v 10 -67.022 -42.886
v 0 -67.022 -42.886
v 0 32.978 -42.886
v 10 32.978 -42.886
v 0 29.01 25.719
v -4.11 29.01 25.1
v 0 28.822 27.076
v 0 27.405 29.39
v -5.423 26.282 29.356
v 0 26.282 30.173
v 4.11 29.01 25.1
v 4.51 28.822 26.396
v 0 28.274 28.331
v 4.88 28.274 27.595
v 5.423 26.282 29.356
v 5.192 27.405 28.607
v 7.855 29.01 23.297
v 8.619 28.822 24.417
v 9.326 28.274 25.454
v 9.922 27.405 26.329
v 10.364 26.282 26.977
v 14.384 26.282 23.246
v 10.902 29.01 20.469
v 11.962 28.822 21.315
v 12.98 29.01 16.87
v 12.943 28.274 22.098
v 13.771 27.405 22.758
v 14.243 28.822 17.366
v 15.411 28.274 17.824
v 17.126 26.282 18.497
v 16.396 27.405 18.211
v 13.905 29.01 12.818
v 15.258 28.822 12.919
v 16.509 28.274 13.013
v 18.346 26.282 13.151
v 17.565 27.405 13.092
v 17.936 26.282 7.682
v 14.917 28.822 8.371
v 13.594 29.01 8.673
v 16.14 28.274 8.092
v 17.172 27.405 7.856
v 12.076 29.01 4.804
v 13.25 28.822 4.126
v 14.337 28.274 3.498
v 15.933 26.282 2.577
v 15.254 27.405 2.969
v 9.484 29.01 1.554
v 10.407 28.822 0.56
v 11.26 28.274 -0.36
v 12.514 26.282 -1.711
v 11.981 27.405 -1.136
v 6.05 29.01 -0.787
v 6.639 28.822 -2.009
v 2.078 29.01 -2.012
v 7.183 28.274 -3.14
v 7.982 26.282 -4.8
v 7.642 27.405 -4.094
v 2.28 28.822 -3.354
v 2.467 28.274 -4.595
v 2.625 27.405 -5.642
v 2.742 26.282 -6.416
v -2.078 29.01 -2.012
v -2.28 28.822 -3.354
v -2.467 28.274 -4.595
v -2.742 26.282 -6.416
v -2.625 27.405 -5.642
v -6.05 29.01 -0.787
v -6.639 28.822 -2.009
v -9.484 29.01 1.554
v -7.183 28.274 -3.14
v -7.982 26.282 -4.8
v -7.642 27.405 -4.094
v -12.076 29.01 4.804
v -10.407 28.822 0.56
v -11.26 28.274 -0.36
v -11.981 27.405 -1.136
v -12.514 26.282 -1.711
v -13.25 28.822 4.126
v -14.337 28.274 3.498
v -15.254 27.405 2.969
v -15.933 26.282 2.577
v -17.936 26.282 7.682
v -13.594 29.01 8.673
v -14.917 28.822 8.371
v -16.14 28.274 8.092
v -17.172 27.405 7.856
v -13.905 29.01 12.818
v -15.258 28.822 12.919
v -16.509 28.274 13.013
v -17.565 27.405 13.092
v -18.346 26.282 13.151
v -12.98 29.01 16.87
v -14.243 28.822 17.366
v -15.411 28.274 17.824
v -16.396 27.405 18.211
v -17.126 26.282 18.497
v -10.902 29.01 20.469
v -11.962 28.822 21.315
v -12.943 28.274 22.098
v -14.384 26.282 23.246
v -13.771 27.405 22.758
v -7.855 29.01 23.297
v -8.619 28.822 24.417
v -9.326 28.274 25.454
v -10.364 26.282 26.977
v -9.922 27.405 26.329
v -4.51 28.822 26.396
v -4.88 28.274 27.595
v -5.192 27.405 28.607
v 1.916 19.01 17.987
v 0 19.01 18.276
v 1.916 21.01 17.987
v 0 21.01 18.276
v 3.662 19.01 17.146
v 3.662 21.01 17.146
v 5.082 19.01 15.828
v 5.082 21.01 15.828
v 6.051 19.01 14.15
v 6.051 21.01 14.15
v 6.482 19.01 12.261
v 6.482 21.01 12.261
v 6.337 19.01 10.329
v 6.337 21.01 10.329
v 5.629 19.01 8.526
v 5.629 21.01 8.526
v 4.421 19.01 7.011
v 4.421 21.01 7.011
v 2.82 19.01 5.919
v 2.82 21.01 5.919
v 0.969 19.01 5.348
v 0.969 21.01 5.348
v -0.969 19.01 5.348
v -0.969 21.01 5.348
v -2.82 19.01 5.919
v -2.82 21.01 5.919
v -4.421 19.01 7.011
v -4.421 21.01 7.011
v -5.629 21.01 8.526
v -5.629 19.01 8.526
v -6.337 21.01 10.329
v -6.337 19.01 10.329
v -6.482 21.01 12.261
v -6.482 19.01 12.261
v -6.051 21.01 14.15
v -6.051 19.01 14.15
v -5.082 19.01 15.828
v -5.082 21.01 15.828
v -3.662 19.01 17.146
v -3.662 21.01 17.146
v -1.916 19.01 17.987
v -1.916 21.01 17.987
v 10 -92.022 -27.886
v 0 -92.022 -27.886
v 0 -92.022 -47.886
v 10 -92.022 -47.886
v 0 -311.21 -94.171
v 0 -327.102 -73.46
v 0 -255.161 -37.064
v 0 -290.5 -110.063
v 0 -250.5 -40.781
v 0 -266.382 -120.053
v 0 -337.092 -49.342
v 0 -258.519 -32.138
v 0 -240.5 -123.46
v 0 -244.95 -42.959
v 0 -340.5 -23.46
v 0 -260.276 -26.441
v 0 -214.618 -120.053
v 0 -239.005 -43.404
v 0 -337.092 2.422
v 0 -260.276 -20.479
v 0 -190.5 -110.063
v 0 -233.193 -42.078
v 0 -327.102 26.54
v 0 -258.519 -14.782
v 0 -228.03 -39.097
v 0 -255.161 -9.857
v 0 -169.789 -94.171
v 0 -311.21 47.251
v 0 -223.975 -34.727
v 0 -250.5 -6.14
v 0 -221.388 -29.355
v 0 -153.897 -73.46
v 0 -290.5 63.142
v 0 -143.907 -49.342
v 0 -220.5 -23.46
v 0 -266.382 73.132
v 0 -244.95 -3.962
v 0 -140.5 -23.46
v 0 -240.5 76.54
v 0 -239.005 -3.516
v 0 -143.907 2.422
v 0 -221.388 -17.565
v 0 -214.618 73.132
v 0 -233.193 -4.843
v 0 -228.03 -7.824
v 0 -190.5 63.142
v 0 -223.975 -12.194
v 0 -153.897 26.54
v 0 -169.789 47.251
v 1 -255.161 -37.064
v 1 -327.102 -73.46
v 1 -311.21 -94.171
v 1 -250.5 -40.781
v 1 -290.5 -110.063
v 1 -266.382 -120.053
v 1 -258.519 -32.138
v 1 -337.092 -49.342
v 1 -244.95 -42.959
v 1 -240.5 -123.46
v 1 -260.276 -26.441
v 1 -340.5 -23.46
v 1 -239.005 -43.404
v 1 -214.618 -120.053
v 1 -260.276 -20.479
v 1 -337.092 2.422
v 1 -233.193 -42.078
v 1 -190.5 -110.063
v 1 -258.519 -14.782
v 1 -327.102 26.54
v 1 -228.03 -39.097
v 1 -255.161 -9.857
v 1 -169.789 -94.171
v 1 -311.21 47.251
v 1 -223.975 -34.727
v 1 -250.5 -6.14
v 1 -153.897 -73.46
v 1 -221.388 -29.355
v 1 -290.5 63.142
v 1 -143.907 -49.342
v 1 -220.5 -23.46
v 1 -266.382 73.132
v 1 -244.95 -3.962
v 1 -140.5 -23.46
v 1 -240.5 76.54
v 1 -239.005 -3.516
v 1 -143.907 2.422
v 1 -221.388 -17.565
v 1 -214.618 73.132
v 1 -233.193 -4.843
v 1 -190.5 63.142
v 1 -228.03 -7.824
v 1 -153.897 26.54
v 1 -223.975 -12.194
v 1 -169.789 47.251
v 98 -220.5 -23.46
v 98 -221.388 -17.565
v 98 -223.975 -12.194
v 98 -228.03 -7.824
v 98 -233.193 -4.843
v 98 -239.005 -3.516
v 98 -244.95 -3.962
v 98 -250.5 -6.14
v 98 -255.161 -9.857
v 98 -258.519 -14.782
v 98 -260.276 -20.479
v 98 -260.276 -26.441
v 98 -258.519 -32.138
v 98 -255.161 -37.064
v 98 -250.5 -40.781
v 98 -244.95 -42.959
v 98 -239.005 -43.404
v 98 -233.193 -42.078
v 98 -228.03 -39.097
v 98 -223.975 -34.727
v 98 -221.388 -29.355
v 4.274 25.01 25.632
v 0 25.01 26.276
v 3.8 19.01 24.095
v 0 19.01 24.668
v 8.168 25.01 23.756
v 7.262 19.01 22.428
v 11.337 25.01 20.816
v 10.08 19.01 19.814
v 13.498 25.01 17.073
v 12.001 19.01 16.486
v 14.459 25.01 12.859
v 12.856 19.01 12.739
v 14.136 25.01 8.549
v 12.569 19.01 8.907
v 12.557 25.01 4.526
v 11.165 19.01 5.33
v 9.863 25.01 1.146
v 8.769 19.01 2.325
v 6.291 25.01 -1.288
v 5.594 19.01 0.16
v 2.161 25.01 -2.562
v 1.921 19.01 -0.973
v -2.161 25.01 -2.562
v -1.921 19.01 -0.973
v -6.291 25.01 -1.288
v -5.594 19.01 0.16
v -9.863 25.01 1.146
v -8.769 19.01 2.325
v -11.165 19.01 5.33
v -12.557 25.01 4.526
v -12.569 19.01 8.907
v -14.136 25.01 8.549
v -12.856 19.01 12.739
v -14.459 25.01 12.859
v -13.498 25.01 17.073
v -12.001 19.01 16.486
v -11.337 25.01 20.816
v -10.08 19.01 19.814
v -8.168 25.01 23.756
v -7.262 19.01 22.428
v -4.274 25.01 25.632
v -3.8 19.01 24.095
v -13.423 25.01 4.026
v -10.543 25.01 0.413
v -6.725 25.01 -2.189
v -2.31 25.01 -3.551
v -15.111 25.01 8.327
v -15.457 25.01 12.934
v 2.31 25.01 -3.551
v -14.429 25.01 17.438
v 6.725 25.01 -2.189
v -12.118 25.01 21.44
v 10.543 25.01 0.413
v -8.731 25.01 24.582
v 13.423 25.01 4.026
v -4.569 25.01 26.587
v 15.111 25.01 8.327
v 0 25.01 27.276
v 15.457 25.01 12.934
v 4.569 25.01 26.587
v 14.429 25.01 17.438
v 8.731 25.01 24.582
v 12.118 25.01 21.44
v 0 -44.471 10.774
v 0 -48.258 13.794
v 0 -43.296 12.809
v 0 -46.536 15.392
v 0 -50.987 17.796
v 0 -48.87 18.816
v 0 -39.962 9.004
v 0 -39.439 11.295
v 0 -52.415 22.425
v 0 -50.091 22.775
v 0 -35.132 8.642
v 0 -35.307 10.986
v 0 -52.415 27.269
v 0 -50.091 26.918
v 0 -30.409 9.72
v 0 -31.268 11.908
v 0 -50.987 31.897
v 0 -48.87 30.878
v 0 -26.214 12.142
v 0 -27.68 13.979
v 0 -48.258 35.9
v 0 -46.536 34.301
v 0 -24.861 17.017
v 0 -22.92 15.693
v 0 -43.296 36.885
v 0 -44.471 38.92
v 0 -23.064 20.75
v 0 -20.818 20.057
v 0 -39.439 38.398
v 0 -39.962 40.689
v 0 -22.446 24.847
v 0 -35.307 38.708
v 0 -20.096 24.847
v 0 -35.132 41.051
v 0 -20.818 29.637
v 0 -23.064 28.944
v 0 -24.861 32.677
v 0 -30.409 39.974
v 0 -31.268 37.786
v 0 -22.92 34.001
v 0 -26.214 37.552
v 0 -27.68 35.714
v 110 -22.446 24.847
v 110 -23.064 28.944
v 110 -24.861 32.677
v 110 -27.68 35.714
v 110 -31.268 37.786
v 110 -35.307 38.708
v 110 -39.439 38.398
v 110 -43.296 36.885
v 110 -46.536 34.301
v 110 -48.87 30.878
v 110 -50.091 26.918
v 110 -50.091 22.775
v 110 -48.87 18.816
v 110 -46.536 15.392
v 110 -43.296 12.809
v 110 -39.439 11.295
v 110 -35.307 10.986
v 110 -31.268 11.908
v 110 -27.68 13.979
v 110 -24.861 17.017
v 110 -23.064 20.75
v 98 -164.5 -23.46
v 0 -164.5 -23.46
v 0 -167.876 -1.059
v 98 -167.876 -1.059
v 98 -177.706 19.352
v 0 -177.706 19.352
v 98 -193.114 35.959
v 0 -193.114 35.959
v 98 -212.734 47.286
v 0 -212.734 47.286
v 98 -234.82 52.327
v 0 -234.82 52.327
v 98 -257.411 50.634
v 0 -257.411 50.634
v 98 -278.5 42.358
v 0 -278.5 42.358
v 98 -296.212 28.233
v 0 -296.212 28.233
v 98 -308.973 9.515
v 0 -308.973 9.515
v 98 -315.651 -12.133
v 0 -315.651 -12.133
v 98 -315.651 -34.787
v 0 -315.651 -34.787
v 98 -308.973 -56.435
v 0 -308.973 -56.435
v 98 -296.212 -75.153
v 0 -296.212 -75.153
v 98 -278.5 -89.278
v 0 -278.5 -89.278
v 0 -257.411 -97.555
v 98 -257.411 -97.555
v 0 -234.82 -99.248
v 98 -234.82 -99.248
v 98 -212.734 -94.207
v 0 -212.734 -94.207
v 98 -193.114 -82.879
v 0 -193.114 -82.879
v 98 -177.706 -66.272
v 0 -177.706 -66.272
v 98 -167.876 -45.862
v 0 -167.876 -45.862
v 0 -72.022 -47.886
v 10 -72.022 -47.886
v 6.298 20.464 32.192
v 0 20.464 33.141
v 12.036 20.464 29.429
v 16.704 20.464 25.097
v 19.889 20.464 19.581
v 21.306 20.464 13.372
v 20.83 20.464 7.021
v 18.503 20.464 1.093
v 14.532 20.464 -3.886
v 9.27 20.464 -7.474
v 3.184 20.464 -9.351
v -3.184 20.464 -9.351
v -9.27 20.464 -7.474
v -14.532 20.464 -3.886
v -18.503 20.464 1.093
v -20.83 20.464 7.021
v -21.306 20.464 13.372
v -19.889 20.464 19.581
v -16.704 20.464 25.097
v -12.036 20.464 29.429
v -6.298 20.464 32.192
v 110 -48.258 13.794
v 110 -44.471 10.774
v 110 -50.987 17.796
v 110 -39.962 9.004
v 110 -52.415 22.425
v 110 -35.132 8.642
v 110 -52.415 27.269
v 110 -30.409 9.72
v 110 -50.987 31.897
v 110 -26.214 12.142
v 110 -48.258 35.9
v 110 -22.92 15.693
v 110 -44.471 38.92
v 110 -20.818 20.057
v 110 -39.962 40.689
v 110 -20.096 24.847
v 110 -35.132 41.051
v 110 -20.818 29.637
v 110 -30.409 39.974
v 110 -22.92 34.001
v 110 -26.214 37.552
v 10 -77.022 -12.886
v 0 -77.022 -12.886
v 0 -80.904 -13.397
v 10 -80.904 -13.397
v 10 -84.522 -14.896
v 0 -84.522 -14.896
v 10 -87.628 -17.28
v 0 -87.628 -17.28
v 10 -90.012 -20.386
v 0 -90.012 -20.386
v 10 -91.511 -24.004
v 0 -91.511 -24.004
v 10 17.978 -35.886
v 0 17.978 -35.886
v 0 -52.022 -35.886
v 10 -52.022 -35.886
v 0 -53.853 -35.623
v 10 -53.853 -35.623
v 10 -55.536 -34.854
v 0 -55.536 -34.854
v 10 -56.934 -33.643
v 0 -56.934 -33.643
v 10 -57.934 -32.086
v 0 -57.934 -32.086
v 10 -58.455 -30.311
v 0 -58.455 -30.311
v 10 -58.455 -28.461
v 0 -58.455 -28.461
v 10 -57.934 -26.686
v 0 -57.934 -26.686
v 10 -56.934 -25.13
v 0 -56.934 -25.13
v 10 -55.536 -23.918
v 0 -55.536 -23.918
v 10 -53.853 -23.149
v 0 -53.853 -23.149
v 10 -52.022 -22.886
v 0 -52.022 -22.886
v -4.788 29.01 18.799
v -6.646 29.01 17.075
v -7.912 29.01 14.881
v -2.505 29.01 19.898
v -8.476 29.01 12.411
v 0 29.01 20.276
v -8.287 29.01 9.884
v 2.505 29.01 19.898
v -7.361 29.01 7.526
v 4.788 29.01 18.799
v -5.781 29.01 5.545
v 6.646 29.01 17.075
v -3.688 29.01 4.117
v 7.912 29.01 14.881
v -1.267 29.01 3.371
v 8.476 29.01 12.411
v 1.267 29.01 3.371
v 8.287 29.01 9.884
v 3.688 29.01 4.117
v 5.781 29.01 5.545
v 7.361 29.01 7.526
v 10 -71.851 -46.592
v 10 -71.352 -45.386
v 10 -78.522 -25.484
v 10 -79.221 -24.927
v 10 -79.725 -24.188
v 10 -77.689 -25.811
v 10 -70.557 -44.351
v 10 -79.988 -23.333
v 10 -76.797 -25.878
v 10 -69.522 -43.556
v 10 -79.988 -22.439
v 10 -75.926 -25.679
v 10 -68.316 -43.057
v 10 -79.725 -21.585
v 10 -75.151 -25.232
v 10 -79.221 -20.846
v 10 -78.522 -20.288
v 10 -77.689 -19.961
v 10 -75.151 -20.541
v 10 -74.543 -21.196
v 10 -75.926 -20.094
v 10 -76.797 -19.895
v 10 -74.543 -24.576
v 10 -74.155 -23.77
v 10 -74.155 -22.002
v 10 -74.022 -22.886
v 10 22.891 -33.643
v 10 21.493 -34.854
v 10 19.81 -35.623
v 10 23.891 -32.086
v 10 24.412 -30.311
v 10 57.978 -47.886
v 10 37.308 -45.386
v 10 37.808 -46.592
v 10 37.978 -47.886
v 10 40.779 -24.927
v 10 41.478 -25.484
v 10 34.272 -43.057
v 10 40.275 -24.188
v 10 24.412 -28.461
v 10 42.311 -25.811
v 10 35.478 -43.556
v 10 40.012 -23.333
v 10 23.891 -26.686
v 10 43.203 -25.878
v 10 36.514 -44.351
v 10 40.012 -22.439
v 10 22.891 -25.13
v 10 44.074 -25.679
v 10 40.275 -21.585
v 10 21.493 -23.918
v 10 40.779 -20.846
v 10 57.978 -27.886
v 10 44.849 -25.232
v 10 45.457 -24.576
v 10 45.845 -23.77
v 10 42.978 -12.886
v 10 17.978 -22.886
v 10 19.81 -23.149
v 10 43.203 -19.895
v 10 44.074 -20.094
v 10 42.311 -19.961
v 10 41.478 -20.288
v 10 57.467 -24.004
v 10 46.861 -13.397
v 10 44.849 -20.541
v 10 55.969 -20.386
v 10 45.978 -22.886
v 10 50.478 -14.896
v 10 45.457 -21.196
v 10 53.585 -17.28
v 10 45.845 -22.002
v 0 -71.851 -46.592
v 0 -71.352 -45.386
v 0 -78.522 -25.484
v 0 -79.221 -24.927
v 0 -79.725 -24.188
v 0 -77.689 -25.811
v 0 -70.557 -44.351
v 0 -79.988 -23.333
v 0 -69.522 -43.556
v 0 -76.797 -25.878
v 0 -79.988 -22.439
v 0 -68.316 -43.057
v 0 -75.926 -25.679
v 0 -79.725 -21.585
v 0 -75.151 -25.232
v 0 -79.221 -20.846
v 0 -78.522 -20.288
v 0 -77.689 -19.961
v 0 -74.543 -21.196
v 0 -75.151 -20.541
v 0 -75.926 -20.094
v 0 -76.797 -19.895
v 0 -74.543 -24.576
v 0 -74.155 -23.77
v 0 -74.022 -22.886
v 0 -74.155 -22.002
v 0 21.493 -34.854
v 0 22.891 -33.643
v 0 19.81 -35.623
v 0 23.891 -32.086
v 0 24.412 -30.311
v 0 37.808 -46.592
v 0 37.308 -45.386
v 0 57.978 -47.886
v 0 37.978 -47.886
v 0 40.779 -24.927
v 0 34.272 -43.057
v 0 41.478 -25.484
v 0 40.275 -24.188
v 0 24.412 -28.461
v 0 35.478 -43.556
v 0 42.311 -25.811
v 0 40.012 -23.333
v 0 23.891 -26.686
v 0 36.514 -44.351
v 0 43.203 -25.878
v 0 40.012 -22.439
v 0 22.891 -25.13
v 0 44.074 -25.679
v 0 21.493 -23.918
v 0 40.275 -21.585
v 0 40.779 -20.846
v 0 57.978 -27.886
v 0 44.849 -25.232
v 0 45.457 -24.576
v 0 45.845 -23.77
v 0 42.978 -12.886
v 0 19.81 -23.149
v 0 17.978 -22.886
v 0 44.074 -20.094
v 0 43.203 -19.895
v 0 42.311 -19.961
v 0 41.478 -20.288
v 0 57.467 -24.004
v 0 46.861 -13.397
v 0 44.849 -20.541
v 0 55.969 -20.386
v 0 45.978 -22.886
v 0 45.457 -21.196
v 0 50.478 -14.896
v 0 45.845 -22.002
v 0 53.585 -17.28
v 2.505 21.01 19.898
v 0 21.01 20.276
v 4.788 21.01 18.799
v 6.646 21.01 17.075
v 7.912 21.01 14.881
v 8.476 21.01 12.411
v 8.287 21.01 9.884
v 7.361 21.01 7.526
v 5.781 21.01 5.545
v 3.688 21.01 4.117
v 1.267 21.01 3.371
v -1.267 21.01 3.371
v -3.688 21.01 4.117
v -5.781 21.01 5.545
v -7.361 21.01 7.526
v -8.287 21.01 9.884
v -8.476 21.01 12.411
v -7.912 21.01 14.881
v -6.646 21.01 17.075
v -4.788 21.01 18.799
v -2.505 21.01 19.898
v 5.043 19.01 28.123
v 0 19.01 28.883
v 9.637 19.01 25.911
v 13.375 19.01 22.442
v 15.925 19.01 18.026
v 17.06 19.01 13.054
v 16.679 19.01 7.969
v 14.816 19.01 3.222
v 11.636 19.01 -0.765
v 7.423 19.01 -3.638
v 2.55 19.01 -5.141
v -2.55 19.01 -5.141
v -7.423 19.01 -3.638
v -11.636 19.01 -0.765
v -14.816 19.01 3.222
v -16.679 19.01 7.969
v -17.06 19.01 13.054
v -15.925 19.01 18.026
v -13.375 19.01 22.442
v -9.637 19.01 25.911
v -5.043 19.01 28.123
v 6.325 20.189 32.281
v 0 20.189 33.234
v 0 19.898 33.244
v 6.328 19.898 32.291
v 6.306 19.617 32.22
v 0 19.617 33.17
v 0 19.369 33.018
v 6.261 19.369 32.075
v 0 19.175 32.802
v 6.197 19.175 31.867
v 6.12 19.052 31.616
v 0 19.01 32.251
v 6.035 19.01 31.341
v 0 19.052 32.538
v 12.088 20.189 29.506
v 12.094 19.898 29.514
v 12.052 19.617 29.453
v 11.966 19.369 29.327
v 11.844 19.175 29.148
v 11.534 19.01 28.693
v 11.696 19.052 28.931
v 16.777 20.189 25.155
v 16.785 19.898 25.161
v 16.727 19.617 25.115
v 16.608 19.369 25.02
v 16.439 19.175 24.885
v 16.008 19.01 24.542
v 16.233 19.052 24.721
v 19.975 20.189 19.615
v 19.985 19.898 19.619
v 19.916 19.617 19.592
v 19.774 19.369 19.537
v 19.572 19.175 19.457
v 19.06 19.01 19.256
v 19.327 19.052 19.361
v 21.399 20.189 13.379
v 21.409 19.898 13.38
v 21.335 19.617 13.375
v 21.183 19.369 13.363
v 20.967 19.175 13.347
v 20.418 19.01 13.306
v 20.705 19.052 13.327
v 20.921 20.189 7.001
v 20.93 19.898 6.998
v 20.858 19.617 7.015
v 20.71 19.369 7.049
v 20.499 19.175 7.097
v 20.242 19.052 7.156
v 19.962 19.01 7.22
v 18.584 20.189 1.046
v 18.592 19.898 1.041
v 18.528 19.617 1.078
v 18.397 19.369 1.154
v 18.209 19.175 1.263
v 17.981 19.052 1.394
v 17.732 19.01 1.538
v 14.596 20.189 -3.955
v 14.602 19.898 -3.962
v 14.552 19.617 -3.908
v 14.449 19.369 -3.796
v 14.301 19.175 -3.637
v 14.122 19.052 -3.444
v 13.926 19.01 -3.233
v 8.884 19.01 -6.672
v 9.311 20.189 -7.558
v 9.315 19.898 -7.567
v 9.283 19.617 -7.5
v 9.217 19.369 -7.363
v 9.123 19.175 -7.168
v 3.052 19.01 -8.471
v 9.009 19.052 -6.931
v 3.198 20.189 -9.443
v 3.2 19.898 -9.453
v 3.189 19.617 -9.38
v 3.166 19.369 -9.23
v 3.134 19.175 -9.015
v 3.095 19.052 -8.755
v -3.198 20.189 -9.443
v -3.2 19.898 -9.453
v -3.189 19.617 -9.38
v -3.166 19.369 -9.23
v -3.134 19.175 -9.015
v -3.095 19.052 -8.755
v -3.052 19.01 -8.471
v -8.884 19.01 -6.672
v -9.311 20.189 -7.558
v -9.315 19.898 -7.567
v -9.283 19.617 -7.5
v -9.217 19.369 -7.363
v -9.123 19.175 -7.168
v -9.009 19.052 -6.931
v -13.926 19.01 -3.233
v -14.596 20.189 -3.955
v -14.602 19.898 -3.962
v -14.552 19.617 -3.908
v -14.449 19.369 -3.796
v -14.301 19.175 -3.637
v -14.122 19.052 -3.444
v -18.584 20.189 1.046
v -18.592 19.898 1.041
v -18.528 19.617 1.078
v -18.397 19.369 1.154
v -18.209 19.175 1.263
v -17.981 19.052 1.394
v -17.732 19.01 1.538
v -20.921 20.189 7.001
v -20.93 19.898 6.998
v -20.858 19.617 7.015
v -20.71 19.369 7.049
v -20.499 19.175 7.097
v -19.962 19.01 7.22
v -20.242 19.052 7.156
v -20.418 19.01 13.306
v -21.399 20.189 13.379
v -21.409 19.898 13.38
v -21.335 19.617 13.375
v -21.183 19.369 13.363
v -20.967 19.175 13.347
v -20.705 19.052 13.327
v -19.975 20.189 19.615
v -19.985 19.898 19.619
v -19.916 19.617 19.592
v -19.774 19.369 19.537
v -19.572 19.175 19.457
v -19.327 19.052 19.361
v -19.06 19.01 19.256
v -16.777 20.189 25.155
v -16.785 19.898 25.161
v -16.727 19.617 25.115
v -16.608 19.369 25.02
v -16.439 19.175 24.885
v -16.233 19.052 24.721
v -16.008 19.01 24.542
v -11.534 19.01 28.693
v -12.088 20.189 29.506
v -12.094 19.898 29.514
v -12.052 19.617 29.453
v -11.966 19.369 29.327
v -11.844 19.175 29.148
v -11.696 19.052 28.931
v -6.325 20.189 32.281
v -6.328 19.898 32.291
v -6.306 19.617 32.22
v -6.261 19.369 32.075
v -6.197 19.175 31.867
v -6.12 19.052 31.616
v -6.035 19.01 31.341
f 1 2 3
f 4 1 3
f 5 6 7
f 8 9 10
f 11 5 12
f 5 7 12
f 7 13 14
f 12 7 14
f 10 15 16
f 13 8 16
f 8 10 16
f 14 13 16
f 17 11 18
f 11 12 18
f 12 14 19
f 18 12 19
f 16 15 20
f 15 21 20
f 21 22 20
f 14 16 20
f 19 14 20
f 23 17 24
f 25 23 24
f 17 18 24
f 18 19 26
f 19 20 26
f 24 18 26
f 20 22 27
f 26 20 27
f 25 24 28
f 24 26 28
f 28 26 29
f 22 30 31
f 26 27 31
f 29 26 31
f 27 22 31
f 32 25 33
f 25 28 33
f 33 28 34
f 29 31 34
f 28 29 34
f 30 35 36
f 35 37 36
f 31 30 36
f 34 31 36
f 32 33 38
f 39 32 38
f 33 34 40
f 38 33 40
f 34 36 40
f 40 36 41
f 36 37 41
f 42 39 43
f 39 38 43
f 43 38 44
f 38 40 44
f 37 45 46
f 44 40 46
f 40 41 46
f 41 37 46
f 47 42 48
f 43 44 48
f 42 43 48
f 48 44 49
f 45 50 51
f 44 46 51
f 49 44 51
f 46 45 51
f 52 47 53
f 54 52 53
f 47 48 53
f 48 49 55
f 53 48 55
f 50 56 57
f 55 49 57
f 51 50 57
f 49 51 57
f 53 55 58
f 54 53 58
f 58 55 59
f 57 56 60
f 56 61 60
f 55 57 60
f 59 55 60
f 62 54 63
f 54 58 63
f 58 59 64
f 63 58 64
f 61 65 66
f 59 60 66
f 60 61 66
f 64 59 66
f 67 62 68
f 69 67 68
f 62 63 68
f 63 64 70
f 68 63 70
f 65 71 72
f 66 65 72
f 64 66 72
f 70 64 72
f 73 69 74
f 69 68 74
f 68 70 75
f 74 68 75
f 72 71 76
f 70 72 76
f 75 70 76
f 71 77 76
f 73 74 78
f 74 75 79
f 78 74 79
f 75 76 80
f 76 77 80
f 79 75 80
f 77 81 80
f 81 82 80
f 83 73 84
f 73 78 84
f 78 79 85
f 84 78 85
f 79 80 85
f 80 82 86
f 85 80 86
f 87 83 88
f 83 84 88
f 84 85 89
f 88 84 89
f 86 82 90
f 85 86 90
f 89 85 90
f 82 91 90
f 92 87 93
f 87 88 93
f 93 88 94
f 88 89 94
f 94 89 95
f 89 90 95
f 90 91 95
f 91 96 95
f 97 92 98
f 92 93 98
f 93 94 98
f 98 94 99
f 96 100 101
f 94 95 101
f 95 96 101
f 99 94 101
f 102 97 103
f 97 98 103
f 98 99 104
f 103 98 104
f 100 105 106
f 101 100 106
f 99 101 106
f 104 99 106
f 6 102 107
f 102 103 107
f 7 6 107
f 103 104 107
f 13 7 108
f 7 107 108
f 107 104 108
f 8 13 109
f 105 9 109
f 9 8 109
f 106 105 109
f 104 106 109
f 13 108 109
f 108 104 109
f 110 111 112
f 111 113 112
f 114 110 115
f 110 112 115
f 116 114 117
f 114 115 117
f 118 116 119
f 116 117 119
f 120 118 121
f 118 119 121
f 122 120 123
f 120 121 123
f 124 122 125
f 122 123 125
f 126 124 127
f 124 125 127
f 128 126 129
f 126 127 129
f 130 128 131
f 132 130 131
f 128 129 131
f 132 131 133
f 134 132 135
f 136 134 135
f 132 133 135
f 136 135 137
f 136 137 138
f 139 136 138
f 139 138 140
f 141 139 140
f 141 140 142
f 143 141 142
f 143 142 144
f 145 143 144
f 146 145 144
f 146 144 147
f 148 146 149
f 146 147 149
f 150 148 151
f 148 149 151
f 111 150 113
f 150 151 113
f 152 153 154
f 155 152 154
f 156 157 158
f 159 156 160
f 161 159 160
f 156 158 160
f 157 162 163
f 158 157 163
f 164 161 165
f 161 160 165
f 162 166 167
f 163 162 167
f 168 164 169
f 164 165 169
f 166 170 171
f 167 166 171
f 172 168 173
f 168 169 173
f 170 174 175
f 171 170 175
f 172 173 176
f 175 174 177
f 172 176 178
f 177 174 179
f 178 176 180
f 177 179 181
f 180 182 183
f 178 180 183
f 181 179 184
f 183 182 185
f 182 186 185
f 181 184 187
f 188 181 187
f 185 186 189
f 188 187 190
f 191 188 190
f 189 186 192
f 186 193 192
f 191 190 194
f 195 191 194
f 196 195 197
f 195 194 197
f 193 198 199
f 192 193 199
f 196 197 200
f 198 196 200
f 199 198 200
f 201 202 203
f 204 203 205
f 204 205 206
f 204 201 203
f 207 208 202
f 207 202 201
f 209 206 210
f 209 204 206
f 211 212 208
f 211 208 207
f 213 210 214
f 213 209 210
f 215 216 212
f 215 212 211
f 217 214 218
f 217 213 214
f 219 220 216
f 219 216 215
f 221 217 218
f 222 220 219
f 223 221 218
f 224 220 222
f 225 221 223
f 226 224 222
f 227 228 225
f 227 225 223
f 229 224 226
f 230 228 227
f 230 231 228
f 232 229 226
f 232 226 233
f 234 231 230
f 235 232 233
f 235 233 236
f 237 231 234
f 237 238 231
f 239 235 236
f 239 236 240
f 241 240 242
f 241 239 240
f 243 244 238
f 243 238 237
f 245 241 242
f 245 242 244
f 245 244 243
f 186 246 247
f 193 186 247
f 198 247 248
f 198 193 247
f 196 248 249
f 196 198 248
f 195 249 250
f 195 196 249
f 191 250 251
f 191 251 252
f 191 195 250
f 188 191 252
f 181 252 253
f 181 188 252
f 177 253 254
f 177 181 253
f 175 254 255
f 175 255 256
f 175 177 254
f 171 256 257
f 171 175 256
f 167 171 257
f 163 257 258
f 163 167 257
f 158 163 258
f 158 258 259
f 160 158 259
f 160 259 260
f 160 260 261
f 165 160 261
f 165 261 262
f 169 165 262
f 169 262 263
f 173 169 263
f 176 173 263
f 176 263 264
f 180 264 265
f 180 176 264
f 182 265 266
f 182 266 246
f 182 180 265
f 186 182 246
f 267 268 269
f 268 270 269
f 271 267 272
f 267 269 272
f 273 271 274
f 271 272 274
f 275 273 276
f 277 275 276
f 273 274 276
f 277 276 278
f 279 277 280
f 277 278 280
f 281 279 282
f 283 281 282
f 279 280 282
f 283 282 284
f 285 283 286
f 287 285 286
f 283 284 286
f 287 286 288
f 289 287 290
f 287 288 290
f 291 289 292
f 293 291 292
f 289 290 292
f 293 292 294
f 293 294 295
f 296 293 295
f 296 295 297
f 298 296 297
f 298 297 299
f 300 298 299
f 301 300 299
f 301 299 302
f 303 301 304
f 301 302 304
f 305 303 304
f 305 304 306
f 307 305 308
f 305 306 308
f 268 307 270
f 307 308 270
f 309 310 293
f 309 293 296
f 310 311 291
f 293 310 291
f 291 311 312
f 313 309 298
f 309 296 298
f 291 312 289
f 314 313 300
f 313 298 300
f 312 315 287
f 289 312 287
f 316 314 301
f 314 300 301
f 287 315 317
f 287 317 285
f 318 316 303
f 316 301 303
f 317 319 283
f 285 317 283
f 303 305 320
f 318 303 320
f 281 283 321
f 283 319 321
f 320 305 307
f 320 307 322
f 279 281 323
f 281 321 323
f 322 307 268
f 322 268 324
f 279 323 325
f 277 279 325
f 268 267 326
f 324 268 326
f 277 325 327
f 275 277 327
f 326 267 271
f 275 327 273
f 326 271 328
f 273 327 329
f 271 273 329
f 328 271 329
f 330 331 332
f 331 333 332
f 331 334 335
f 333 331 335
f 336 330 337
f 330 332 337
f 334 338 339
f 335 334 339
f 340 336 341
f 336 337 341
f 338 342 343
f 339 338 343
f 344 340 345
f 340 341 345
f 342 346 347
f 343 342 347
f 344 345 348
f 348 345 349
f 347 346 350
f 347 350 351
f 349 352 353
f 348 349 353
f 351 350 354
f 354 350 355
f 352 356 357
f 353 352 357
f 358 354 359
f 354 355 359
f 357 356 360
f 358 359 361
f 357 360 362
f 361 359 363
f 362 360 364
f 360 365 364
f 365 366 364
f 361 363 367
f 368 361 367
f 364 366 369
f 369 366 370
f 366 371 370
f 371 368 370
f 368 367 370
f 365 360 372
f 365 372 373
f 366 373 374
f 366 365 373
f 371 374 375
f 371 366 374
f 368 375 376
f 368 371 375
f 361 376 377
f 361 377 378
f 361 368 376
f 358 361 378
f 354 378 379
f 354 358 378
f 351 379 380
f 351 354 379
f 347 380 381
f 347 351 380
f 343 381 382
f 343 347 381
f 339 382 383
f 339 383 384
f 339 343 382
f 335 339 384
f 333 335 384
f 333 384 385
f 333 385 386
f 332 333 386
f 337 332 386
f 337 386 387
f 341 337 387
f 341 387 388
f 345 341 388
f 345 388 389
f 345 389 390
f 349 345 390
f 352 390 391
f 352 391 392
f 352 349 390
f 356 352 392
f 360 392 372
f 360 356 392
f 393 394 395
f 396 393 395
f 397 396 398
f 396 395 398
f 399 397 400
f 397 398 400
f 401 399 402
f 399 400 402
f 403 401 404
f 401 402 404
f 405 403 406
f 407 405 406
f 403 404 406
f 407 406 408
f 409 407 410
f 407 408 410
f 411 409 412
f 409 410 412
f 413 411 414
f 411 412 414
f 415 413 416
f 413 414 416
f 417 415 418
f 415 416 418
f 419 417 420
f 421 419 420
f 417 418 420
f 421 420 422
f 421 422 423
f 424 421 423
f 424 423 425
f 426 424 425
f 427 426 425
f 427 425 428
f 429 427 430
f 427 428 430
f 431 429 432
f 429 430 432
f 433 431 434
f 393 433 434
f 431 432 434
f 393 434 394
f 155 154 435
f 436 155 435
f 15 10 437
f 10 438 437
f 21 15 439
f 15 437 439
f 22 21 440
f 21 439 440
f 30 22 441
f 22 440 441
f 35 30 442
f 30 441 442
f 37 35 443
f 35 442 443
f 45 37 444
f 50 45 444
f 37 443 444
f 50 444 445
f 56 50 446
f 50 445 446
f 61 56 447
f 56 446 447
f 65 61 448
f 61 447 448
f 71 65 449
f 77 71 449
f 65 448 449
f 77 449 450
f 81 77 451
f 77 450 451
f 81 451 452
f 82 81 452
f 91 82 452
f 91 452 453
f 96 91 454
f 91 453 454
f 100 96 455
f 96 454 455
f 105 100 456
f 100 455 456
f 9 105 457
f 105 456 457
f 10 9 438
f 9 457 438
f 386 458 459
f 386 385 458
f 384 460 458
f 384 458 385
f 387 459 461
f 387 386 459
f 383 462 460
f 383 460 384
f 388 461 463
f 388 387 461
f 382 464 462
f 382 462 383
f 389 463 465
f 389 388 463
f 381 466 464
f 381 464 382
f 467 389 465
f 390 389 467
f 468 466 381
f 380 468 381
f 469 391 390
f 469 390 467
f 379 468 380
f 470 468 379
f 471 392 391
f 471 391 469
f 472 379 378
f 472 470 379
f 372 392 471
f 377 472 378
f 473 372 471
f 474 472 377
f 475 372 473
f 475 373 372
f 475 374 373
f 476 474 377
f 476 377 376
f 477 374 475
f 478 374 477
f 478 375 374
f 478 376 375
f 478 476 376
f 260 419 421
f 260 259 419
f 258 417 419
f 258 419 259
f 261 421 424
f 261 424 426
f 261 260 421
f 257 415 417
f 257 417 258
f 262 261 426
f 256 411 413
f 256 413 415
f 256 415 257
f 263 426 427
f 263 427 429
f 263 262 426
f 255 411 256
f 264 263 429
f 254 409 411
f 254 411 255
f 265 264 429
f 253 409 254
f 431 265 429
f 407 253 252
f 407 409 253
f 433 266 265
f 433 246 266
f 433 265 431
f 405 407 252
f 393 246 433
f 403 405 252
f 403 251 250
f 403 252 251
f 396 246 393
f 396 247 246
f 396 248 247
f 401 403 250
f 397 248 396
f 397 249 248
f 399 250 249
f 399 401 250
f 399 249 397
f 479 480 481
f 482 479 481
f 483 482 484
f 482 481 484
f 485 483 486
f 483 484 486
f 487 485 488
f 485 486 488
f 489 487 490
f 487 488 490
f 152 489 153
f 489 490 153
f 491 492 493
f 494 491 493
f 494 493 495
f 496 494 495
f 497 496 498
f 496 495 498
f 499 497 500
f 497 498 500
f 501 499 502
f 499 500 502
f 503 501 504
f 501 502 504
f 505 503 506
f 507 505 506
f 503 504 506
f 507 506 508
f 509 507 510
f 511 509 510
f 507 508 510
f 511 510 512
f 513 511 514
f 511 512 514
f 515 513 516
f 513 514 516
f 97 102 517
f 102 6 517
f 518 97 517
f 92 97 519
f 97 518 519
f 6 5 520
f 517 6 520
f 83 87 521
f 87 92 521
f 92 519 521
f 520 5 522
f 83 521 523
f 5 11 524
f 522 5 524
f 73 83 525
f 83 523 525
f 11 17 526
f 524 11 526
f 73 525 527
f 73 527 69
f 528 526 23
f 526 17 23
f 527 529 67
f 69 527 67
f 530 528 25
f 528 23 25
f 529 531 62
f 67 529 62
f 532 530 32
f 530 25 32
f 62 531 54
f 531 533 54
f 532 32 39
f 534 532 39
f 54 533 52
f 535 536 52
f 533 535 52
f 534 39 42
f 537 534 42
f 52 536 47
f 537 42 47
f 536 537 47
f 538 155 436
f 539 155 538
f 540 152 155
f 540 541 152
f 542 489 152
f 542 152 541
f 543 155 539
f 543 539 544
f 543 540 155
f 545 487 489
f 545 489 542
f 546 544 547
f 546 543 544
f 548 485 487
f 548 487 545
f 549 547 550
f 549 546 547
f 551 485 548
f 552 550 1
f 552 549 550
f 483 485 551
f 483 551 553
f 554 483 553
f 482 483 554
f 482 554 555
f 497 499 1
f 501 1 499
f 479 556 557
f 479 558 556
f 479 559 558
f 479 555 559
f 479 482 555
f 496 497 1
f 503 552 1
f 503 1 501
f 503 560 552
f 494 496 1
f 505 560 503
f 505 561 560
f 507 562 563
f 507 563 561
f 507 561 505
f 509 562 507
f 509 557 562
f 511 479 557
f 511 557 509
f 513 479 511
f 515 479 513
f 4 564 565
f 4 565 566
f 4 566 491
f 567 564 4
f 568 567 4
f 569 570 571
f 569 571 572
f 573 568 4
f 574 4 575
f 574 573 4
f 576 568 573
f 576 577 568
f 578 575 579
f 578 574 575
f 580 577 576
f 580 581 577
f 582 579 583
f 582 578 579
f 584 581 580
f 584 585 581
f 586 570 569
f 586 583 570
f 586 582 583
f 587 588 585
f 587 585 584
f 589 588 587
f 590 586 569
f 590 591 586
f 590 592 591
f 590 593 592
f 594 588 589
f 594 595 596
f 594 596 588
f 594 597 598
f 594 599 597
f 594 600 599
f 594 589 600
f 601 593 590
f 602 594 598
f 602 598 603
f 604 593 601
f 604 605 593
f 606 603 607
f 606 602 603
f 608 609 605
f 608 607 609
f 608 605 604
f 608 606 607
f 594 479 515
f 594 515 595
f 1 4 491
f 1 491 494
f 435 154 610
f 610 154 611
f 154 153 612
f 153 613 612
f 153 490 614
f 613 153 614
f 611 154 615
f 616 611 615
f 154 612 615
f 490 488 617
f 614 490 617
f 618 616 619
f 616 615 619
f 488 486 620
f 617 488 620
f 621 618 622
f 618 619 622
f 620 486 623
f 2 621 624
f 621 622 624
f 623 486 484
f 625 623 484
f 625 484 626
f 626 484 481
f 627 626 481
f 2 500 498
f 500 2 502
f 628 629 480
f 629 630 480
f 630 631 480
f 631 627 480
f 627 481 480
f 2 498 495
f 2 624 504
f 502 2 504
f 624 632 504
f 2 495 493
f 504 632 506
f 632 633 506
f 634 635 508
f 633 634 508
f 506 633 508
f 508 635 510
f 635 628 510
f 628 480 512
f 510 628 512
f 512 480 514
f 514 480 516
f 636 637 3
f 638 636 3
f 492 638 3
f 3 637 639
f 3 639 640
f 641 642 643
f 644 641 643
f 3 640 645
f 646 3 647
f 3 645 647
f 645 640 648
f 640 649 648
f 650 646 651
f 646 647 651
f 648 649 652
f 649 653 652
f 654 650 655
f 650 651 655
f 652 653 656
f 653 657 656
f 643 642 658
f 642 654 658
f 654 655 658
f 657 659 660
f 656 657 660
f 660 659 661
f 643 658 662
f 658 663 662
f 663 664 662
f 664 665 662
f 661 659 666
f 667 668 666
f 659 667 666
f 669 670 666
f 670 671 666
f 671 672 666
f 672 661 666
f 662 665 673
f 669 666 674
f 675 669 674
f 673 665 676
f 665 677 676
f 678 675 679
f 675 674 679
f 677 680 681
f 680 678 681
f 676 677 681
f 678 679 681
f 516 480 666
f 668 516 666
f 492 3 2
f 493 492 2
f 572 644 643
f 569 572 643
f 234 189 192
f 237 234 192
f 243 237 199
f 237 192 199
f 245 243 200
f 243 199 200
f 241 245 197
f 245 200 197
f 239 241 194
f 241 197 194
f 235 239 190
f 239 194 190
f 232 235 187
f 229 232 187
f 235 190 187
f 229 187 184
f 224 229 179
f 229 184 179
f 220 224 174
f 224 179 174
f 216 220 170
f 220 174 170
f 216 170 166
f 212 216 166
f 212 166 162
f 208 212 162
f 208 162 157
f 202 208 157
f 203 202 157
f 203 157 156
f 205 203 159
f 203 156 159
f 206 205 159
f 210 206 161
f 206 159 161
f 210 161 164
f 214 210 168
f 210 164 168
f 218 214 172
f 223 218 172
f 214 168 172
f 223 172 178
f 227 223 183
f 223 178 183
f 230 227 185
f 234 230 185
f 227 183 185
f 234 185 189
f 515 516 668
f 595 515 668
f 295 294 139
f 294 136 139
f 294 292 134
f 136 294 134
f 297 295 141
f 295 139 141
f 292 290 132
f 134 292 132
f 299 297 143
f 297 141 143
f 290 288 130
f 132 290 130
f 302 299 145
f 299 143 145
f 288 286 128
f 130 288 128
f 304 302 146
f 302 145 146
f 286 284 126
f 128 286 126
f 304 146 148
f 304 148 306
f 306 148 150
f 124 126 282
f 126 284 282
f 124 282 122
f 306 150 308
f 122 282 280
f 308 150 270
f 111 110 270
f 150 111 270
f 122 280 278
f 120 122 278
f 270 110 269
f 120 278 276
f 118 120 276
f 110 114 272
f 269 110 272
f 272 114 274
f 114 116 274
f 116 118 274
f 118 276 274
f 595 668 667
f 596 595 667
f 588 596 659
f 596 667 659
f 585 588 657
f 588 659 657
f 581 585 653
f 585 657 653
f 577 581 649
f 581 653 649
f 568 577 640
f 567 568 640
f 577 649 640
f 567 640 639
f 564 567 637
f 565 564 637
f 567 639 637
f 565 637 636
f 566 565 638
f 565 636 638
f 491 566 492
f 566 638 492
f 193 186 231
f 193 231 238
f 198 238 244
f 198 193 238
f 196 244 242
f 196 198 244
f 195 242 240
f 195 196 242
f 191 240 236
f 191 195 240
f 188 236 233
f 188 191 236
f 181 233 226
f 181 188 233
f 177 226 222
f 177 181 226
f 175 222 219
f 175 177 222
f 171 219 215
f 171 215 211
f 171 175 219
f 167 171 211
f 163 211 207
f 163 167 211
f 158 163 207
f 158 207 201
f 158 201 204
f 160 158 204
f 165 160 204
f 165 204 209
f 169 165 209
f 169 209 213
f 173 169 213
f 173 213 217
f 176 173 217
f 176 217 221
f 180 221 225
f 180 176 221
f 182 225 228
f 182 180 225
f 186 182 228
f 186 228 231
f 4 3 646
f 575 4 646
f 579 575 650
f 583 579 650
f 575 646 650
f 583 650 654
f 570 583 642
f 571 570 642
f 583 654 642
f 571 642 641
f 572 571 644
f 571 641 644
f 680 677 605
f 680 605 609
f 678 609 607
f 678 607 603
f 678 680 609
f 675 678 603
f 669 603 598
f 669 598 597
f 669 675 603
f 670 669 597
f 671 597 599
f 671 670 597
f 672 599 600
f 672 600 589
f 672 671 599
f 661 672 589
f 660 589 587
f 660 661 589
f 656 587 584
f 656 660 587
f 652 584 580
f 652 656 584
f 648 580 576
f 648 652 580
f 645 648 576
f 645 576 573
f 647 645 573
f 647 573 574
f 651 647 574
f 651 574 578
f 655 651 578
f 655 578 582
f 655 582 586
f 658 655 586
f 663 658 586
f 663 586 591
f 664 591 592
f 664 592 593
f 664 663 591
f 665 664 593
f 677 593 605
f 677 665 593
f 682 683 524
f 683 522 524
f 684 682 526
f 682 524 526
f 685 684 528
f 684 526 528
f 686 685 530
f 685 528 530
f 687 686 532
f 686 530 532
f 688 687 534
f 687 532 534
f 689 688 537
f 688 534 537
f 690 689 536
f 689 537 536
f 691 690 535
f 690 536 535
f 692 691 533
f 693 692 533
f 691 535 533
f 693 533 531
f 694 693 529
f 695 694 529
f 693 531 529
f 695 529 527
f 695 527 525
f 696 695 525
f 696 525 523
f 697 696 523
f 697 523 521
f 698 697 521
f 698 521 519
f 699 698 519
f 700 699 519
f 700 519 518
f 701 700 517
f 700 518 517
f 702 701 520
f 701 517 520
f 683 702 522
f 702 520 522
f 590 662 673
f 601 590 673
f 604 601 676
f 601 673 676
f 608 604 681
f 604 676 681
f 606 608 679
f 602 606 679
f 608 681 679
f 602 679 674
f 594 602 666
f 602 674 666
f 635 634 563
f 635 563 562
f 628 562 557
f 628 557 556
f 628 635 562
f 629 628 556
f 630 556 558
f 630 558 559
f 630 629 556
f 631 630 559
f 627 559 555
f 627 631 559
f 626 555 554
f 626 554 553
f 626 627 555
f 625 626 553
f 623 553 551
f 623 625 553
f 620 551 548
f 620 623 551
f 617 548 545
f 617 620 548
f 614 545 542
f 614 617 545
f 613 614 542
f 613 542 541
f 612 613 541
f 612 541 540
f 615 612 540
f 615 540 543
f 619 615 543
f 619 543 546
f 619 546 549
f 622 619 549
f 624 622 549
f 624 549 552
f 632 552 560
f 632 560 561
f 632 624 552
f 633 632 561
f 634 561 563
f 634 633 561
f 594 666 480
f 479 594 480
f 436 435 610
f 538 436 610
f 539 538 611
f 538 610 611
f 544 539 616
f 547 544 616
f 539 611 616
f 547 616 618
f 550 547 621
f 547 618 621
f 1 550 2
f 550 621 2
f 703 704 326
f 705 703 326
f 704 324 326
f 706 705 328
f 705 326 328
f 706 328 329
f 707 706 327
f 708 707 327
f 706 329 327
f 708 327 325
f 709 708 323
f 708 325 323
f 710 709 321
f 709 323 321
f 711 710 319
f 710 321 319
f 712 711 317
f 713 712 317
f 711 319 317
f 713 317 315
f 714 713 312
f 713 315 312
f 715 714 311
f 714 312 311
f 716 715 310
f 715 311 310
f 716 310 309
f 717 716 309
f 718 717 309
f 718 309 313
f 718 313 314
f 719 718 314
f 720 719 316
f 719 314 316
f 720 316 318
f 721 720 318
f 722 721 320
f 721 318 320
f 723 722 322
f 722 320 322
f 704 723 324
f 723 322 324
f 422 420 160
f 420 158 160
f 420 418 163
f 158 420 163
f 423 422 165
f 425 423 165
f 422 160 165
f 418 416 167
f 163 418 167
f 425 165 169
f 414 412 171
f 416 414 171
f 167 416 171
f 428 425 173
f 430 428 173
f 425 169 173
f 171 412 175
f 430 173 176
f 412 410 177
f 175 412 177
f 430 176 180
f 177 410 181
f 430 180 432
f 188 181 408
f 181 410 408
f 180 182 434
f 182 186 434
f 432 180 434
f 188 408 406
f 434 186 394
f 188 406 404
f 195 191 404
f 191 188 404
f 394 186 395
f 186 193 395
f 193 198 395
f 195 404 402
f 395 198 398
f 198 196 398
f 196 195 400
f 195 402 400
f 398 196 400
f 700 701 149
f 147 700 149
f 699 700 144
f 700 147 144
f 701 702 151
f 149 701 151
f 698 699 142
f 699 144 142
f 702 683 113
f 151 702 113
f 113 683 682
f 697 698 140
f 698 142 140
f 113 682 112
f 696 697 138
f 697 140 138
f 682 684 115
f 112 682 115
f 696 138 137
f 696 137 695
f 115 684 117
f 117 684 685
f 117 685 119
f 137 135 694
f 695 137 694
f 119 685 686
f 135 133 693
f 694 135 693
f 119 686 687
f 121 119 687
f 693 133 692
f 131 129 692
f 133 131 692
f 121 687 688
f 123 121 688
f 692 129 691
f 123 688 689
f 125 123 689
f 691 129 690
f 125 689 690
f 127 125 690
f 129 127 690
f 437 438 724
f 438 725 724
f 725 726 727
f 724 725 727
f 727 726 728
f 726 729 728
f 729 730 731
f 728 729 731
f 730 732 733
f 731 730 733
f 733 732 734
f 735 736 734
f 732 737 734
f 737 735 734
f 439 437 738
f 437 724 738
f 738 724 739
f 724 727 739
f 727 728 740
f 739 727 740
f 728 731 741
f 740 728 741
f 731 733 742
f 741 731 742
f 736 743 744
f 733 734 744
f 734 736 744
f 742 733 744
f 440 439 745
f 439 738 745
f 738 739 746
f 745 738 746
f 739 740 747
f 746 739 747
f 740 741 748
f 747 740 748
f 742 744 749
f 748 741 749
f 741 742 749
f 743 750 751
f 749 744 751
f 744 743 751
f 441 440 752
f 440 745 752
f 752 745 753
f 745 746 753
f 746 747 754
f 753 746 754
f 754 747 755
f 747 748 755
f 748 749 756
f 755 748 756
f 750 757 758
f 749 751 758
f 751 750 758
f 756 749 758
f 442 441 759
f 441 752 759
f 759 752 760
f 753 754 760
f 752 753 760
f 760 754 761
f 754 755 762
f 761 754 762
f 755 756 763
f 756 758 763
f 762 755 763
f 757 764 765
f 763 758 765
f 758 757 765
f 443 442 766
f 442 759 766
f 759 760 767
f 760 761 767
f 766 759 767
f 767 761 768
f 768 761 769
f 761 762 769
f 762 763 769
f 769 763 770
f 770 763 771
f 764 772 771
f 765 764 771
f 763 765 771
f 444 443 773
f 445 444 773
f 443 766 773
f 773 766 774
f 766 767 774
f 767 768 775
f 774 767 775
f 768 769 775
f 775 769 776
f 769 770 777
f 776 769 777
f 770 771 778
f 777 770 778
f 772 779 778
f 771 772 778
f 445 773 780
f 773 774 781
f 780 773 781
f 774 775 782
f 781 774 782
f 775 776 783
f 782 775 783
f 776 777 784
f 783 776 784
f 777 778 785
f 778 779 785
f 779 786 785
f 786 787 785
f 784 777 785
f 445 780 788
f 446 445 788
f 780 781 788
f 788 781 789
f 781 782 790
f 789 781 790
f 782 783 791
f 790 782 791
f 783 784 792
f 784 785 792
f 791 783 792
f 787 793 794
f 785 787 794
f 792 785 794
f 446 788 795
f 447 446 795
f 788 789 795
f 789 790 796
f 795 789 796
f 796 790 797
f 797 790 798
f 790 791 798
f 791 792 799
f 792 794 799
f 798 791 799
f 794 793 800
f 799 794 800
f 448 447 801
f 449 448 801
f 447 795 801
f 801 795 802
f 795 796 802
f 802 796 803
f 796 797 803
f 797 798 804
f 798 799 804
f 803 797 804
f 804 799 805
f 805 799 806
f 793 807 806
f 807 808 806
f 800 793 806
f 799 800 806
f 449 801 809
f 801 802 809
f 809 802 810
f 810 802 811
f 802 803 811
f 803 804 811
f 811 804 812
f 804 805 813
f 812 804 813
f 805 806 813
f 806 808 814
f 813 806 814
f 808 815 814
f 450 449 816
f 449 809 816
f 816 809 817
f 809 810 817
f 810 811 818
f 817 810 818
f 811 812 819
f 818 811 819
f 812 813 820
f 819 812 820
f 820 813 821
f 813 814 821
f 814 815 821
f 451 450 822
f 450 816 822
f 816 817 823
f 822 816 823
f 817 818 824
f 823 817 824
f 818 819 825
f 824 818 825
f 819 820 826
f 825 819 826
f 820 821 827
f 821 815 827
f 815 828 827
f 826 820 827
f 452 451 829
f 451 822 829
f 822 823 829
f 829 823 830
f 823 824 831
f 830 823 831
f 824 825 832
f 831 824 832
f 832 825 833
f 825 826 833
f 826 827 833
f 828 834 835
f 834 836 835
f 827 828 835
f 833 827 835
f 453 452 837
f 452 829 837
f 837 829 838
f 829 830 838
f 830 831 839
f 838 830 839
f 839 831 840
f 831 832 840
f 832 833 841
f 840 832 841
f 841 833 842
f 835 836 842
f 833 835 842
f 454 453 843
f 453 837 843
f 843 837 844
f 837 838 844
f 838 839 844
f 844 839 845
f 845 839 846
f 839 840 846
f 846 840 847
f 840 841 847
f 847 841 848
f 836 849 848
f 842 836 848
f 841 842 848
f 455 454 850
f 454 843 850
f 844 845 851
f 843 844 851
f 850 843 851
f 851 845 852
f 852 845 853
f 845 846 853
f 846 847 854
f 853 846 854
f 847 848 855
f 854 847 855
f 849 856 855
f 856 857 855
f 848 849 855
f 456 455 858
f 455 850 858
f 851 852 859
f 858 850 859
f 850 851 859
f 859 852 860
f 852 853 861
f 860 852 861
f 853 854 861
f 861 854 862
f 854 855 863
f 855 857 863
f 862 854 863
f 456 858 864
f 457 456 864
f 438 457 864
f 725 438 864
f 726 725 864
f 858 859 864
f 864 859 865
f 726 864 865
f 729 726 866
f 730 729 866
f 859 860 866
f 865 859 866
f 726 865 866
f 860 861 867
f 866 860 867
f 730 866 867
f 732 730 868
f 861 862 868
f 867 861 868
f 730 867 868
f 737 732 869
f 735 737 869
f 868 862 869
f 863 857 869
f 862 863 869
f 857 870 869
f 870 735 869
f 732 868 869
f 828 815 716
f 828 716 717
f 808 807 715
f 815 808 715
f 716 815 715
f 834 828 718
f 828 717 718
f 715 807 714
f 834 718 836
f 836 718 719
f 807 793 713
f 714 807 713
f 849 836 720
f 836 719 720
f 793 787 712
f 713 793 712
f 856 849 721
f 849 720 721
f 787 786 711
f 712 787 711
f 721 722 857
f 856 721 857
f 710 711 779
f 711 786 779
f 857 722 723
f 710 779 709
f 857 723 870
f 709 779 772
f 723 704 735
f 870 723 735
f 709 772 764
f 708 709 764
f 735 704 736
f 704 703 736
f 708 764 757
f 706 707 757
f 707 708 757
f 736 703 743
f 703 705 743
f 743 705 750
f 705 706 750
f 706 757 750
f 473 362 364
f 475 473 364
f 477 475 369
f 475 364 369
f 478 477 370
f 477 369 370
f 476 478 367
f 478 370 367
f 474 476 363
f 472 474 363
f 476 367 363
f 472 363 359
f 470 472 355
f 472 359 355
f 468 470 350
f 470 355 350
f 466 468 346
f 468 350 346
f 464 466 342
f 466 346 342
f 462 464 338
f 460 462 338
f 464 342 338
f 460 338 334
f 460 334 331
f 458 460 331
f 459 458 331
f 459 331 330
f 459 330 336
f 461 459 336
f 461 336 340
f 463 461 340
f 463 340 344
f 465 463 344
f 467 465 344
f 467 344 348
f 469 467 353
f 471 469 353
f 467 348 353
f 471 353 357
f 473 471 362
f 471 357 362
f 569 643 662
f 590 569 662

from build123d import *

# Parameters (mm, degrees)
F0_R     = 16.25
F0_R_2   = 13.9
F2_DEPTH = 110
F0_R_3   = 100
F0_R_4   = 76
F0_R_5   = 20
F3_DEPTH = 1
F4_DEPTH = 98
F0_R_6   = 3
F5_DEPTH = 10


with BuildPart() as f1:
    # F0 (on Right) → F1 (revolve)
    with BuildSketch(Plane.YZ):
        with BuildLine():
            ThreePointArc((20.464217, 33.141372), (19.487489, 33.103372), (19.009769, 32.250598))
            Line((19.009769, 32.250598), (19.009769, 28.883391))
            Line((19.009769, 28.883391), (25.009769, 27.275695))
            Line((25.009769, 27.275695), (25.009769, 26.275695))
            Line((25.009769, 26.275695), (19.009769, 24.668))
            Line((19.009769, 24.668), (19.009769, 18.275695))
            Line((19.009769, 18.275695), (21.009769, 18.275695))
            Line((21.009769, 18.275695), (21.009769, 20.275695))
            Line((21.009769, 20.275695), (29.009769, 20.275695))
            Line((29.009769, 20.275695), (29.009769, 25.719429))
            ThreePointArc((29.009769, 25.719429), (28.27364, 28.330828), (26.282008, 30.173296))
            Line((26.282008, 30.173296), (20.464217, 33.141372))
        make_face()
    revolve(axis=Axis((0, 32.803678, 11.775695), (0, 1, 0)))


with BuildPart() as f2:
    # F0 (on Right) → F2 (new body)
    with BuildSketch(Plane.YZ):
        with Locations((-36.346156, 24.846805)):
            Circle(F0_R)
        with Locations((-36.346156, 24.846805)):
            Circle(F0_R_2, mode=Mode.SUBTRACT)
    extrude(amount=F2_DEPTH)


with BuildPart() as f3:
    # F0 (on Right) → F3 (new body)
    with BuildSketch(Plane.YZ):
        with Locations((-240.499712, -23.46017)):
            Circle(F0_R_3)
        with Locations((-240.499712, -23.46017)):
            Circle(F0_R_4, mode=Mode.SUBTRACT)
        with Locations((-240.499712, -23.46017)):
            Circle(F0_R_4)
        with Locations((-240.499712, -23.46017)):
            Circle(F0_R_5, mode=Mode.SUBTRACT)
    extrude(amount=F3_DEPTH)


with BuildPart() as f4:
    # F0 (on Right) → F4 (new body)
    with BuildSketch(Plane.YZ):
        with Locations((-240.499712, -23.46017)):
            Circle(F0_R_4)
        with Locations((-240.499712, -23.46017)):
            Circle(F0_R_5, mode=Mode.SUBTRACT)
    extrude(amount=F4_DEPTH)


with BuildPart() as f5:
    # F0 (on Right) → F5 (new body)
    with BuildSketch(Plane.YZ):
        with BuildLine():
            Line((42.978356, -12.88617), (-77.021644, -12.88617))
            ThreePointArc((-77.021644, -12.88617), (-87.628245, -17.279569), (-92.021644, -27.88617))
            Line((-92.021644, -27.88617), (-92.021644, -47.88617))
            Line((-92.021644, -47.88617), (-72.021644, -47.88617))
            ThreePointArc((-72.021644, -47.88617), (-70.557177, -44.350637), (-67.021644, -42.88617))
            Line((-67.021644, -42.88617), (32.978356, -42.88617))
            ThreePointArc((32.978356, -42.88617), (36.51389, -44.350637), (37.978356, -47.88617))
            Line((37.978356, -47.88617), (57.978356, -47.88617))
            Line((57.978356, -47.88617), (57.978356, -27.88617))
            ThreePointArc((57.978356, -27.88617), (53.584958, -17.279569), (42.978356, -12.88617))
        make_face()
        with BuildLine():
            Line((-52.021644, -22.88617), (17.978356, -22.88617))
            ThreePointArc((17.978356, -22.88617), (24.478356, -29.38617), (17.978356, -35.88617))
            Line((17.978356, -35.88617), (-52.021644, -35.88617))
            ThreePointArc((-52.021644, -35.88617), (-58.521644, -29.38617), (-52.021644, -22.88617))
        make_face(mode=Mode.SUBTRACT)
        with Locations((-77.021644, -22.88617)):
            Circle(F0_R_6, mode=Mode.SUBTRACT)
        with Locations((42.978356, -22.88617)):
            Circle(F0_R_6, mode=Mode.SUBTRACT)
    extrude(amount=F5_DEPTH)


solid = Compound([f1.part, f2.part, f3.part, f4.part, f5.part])
